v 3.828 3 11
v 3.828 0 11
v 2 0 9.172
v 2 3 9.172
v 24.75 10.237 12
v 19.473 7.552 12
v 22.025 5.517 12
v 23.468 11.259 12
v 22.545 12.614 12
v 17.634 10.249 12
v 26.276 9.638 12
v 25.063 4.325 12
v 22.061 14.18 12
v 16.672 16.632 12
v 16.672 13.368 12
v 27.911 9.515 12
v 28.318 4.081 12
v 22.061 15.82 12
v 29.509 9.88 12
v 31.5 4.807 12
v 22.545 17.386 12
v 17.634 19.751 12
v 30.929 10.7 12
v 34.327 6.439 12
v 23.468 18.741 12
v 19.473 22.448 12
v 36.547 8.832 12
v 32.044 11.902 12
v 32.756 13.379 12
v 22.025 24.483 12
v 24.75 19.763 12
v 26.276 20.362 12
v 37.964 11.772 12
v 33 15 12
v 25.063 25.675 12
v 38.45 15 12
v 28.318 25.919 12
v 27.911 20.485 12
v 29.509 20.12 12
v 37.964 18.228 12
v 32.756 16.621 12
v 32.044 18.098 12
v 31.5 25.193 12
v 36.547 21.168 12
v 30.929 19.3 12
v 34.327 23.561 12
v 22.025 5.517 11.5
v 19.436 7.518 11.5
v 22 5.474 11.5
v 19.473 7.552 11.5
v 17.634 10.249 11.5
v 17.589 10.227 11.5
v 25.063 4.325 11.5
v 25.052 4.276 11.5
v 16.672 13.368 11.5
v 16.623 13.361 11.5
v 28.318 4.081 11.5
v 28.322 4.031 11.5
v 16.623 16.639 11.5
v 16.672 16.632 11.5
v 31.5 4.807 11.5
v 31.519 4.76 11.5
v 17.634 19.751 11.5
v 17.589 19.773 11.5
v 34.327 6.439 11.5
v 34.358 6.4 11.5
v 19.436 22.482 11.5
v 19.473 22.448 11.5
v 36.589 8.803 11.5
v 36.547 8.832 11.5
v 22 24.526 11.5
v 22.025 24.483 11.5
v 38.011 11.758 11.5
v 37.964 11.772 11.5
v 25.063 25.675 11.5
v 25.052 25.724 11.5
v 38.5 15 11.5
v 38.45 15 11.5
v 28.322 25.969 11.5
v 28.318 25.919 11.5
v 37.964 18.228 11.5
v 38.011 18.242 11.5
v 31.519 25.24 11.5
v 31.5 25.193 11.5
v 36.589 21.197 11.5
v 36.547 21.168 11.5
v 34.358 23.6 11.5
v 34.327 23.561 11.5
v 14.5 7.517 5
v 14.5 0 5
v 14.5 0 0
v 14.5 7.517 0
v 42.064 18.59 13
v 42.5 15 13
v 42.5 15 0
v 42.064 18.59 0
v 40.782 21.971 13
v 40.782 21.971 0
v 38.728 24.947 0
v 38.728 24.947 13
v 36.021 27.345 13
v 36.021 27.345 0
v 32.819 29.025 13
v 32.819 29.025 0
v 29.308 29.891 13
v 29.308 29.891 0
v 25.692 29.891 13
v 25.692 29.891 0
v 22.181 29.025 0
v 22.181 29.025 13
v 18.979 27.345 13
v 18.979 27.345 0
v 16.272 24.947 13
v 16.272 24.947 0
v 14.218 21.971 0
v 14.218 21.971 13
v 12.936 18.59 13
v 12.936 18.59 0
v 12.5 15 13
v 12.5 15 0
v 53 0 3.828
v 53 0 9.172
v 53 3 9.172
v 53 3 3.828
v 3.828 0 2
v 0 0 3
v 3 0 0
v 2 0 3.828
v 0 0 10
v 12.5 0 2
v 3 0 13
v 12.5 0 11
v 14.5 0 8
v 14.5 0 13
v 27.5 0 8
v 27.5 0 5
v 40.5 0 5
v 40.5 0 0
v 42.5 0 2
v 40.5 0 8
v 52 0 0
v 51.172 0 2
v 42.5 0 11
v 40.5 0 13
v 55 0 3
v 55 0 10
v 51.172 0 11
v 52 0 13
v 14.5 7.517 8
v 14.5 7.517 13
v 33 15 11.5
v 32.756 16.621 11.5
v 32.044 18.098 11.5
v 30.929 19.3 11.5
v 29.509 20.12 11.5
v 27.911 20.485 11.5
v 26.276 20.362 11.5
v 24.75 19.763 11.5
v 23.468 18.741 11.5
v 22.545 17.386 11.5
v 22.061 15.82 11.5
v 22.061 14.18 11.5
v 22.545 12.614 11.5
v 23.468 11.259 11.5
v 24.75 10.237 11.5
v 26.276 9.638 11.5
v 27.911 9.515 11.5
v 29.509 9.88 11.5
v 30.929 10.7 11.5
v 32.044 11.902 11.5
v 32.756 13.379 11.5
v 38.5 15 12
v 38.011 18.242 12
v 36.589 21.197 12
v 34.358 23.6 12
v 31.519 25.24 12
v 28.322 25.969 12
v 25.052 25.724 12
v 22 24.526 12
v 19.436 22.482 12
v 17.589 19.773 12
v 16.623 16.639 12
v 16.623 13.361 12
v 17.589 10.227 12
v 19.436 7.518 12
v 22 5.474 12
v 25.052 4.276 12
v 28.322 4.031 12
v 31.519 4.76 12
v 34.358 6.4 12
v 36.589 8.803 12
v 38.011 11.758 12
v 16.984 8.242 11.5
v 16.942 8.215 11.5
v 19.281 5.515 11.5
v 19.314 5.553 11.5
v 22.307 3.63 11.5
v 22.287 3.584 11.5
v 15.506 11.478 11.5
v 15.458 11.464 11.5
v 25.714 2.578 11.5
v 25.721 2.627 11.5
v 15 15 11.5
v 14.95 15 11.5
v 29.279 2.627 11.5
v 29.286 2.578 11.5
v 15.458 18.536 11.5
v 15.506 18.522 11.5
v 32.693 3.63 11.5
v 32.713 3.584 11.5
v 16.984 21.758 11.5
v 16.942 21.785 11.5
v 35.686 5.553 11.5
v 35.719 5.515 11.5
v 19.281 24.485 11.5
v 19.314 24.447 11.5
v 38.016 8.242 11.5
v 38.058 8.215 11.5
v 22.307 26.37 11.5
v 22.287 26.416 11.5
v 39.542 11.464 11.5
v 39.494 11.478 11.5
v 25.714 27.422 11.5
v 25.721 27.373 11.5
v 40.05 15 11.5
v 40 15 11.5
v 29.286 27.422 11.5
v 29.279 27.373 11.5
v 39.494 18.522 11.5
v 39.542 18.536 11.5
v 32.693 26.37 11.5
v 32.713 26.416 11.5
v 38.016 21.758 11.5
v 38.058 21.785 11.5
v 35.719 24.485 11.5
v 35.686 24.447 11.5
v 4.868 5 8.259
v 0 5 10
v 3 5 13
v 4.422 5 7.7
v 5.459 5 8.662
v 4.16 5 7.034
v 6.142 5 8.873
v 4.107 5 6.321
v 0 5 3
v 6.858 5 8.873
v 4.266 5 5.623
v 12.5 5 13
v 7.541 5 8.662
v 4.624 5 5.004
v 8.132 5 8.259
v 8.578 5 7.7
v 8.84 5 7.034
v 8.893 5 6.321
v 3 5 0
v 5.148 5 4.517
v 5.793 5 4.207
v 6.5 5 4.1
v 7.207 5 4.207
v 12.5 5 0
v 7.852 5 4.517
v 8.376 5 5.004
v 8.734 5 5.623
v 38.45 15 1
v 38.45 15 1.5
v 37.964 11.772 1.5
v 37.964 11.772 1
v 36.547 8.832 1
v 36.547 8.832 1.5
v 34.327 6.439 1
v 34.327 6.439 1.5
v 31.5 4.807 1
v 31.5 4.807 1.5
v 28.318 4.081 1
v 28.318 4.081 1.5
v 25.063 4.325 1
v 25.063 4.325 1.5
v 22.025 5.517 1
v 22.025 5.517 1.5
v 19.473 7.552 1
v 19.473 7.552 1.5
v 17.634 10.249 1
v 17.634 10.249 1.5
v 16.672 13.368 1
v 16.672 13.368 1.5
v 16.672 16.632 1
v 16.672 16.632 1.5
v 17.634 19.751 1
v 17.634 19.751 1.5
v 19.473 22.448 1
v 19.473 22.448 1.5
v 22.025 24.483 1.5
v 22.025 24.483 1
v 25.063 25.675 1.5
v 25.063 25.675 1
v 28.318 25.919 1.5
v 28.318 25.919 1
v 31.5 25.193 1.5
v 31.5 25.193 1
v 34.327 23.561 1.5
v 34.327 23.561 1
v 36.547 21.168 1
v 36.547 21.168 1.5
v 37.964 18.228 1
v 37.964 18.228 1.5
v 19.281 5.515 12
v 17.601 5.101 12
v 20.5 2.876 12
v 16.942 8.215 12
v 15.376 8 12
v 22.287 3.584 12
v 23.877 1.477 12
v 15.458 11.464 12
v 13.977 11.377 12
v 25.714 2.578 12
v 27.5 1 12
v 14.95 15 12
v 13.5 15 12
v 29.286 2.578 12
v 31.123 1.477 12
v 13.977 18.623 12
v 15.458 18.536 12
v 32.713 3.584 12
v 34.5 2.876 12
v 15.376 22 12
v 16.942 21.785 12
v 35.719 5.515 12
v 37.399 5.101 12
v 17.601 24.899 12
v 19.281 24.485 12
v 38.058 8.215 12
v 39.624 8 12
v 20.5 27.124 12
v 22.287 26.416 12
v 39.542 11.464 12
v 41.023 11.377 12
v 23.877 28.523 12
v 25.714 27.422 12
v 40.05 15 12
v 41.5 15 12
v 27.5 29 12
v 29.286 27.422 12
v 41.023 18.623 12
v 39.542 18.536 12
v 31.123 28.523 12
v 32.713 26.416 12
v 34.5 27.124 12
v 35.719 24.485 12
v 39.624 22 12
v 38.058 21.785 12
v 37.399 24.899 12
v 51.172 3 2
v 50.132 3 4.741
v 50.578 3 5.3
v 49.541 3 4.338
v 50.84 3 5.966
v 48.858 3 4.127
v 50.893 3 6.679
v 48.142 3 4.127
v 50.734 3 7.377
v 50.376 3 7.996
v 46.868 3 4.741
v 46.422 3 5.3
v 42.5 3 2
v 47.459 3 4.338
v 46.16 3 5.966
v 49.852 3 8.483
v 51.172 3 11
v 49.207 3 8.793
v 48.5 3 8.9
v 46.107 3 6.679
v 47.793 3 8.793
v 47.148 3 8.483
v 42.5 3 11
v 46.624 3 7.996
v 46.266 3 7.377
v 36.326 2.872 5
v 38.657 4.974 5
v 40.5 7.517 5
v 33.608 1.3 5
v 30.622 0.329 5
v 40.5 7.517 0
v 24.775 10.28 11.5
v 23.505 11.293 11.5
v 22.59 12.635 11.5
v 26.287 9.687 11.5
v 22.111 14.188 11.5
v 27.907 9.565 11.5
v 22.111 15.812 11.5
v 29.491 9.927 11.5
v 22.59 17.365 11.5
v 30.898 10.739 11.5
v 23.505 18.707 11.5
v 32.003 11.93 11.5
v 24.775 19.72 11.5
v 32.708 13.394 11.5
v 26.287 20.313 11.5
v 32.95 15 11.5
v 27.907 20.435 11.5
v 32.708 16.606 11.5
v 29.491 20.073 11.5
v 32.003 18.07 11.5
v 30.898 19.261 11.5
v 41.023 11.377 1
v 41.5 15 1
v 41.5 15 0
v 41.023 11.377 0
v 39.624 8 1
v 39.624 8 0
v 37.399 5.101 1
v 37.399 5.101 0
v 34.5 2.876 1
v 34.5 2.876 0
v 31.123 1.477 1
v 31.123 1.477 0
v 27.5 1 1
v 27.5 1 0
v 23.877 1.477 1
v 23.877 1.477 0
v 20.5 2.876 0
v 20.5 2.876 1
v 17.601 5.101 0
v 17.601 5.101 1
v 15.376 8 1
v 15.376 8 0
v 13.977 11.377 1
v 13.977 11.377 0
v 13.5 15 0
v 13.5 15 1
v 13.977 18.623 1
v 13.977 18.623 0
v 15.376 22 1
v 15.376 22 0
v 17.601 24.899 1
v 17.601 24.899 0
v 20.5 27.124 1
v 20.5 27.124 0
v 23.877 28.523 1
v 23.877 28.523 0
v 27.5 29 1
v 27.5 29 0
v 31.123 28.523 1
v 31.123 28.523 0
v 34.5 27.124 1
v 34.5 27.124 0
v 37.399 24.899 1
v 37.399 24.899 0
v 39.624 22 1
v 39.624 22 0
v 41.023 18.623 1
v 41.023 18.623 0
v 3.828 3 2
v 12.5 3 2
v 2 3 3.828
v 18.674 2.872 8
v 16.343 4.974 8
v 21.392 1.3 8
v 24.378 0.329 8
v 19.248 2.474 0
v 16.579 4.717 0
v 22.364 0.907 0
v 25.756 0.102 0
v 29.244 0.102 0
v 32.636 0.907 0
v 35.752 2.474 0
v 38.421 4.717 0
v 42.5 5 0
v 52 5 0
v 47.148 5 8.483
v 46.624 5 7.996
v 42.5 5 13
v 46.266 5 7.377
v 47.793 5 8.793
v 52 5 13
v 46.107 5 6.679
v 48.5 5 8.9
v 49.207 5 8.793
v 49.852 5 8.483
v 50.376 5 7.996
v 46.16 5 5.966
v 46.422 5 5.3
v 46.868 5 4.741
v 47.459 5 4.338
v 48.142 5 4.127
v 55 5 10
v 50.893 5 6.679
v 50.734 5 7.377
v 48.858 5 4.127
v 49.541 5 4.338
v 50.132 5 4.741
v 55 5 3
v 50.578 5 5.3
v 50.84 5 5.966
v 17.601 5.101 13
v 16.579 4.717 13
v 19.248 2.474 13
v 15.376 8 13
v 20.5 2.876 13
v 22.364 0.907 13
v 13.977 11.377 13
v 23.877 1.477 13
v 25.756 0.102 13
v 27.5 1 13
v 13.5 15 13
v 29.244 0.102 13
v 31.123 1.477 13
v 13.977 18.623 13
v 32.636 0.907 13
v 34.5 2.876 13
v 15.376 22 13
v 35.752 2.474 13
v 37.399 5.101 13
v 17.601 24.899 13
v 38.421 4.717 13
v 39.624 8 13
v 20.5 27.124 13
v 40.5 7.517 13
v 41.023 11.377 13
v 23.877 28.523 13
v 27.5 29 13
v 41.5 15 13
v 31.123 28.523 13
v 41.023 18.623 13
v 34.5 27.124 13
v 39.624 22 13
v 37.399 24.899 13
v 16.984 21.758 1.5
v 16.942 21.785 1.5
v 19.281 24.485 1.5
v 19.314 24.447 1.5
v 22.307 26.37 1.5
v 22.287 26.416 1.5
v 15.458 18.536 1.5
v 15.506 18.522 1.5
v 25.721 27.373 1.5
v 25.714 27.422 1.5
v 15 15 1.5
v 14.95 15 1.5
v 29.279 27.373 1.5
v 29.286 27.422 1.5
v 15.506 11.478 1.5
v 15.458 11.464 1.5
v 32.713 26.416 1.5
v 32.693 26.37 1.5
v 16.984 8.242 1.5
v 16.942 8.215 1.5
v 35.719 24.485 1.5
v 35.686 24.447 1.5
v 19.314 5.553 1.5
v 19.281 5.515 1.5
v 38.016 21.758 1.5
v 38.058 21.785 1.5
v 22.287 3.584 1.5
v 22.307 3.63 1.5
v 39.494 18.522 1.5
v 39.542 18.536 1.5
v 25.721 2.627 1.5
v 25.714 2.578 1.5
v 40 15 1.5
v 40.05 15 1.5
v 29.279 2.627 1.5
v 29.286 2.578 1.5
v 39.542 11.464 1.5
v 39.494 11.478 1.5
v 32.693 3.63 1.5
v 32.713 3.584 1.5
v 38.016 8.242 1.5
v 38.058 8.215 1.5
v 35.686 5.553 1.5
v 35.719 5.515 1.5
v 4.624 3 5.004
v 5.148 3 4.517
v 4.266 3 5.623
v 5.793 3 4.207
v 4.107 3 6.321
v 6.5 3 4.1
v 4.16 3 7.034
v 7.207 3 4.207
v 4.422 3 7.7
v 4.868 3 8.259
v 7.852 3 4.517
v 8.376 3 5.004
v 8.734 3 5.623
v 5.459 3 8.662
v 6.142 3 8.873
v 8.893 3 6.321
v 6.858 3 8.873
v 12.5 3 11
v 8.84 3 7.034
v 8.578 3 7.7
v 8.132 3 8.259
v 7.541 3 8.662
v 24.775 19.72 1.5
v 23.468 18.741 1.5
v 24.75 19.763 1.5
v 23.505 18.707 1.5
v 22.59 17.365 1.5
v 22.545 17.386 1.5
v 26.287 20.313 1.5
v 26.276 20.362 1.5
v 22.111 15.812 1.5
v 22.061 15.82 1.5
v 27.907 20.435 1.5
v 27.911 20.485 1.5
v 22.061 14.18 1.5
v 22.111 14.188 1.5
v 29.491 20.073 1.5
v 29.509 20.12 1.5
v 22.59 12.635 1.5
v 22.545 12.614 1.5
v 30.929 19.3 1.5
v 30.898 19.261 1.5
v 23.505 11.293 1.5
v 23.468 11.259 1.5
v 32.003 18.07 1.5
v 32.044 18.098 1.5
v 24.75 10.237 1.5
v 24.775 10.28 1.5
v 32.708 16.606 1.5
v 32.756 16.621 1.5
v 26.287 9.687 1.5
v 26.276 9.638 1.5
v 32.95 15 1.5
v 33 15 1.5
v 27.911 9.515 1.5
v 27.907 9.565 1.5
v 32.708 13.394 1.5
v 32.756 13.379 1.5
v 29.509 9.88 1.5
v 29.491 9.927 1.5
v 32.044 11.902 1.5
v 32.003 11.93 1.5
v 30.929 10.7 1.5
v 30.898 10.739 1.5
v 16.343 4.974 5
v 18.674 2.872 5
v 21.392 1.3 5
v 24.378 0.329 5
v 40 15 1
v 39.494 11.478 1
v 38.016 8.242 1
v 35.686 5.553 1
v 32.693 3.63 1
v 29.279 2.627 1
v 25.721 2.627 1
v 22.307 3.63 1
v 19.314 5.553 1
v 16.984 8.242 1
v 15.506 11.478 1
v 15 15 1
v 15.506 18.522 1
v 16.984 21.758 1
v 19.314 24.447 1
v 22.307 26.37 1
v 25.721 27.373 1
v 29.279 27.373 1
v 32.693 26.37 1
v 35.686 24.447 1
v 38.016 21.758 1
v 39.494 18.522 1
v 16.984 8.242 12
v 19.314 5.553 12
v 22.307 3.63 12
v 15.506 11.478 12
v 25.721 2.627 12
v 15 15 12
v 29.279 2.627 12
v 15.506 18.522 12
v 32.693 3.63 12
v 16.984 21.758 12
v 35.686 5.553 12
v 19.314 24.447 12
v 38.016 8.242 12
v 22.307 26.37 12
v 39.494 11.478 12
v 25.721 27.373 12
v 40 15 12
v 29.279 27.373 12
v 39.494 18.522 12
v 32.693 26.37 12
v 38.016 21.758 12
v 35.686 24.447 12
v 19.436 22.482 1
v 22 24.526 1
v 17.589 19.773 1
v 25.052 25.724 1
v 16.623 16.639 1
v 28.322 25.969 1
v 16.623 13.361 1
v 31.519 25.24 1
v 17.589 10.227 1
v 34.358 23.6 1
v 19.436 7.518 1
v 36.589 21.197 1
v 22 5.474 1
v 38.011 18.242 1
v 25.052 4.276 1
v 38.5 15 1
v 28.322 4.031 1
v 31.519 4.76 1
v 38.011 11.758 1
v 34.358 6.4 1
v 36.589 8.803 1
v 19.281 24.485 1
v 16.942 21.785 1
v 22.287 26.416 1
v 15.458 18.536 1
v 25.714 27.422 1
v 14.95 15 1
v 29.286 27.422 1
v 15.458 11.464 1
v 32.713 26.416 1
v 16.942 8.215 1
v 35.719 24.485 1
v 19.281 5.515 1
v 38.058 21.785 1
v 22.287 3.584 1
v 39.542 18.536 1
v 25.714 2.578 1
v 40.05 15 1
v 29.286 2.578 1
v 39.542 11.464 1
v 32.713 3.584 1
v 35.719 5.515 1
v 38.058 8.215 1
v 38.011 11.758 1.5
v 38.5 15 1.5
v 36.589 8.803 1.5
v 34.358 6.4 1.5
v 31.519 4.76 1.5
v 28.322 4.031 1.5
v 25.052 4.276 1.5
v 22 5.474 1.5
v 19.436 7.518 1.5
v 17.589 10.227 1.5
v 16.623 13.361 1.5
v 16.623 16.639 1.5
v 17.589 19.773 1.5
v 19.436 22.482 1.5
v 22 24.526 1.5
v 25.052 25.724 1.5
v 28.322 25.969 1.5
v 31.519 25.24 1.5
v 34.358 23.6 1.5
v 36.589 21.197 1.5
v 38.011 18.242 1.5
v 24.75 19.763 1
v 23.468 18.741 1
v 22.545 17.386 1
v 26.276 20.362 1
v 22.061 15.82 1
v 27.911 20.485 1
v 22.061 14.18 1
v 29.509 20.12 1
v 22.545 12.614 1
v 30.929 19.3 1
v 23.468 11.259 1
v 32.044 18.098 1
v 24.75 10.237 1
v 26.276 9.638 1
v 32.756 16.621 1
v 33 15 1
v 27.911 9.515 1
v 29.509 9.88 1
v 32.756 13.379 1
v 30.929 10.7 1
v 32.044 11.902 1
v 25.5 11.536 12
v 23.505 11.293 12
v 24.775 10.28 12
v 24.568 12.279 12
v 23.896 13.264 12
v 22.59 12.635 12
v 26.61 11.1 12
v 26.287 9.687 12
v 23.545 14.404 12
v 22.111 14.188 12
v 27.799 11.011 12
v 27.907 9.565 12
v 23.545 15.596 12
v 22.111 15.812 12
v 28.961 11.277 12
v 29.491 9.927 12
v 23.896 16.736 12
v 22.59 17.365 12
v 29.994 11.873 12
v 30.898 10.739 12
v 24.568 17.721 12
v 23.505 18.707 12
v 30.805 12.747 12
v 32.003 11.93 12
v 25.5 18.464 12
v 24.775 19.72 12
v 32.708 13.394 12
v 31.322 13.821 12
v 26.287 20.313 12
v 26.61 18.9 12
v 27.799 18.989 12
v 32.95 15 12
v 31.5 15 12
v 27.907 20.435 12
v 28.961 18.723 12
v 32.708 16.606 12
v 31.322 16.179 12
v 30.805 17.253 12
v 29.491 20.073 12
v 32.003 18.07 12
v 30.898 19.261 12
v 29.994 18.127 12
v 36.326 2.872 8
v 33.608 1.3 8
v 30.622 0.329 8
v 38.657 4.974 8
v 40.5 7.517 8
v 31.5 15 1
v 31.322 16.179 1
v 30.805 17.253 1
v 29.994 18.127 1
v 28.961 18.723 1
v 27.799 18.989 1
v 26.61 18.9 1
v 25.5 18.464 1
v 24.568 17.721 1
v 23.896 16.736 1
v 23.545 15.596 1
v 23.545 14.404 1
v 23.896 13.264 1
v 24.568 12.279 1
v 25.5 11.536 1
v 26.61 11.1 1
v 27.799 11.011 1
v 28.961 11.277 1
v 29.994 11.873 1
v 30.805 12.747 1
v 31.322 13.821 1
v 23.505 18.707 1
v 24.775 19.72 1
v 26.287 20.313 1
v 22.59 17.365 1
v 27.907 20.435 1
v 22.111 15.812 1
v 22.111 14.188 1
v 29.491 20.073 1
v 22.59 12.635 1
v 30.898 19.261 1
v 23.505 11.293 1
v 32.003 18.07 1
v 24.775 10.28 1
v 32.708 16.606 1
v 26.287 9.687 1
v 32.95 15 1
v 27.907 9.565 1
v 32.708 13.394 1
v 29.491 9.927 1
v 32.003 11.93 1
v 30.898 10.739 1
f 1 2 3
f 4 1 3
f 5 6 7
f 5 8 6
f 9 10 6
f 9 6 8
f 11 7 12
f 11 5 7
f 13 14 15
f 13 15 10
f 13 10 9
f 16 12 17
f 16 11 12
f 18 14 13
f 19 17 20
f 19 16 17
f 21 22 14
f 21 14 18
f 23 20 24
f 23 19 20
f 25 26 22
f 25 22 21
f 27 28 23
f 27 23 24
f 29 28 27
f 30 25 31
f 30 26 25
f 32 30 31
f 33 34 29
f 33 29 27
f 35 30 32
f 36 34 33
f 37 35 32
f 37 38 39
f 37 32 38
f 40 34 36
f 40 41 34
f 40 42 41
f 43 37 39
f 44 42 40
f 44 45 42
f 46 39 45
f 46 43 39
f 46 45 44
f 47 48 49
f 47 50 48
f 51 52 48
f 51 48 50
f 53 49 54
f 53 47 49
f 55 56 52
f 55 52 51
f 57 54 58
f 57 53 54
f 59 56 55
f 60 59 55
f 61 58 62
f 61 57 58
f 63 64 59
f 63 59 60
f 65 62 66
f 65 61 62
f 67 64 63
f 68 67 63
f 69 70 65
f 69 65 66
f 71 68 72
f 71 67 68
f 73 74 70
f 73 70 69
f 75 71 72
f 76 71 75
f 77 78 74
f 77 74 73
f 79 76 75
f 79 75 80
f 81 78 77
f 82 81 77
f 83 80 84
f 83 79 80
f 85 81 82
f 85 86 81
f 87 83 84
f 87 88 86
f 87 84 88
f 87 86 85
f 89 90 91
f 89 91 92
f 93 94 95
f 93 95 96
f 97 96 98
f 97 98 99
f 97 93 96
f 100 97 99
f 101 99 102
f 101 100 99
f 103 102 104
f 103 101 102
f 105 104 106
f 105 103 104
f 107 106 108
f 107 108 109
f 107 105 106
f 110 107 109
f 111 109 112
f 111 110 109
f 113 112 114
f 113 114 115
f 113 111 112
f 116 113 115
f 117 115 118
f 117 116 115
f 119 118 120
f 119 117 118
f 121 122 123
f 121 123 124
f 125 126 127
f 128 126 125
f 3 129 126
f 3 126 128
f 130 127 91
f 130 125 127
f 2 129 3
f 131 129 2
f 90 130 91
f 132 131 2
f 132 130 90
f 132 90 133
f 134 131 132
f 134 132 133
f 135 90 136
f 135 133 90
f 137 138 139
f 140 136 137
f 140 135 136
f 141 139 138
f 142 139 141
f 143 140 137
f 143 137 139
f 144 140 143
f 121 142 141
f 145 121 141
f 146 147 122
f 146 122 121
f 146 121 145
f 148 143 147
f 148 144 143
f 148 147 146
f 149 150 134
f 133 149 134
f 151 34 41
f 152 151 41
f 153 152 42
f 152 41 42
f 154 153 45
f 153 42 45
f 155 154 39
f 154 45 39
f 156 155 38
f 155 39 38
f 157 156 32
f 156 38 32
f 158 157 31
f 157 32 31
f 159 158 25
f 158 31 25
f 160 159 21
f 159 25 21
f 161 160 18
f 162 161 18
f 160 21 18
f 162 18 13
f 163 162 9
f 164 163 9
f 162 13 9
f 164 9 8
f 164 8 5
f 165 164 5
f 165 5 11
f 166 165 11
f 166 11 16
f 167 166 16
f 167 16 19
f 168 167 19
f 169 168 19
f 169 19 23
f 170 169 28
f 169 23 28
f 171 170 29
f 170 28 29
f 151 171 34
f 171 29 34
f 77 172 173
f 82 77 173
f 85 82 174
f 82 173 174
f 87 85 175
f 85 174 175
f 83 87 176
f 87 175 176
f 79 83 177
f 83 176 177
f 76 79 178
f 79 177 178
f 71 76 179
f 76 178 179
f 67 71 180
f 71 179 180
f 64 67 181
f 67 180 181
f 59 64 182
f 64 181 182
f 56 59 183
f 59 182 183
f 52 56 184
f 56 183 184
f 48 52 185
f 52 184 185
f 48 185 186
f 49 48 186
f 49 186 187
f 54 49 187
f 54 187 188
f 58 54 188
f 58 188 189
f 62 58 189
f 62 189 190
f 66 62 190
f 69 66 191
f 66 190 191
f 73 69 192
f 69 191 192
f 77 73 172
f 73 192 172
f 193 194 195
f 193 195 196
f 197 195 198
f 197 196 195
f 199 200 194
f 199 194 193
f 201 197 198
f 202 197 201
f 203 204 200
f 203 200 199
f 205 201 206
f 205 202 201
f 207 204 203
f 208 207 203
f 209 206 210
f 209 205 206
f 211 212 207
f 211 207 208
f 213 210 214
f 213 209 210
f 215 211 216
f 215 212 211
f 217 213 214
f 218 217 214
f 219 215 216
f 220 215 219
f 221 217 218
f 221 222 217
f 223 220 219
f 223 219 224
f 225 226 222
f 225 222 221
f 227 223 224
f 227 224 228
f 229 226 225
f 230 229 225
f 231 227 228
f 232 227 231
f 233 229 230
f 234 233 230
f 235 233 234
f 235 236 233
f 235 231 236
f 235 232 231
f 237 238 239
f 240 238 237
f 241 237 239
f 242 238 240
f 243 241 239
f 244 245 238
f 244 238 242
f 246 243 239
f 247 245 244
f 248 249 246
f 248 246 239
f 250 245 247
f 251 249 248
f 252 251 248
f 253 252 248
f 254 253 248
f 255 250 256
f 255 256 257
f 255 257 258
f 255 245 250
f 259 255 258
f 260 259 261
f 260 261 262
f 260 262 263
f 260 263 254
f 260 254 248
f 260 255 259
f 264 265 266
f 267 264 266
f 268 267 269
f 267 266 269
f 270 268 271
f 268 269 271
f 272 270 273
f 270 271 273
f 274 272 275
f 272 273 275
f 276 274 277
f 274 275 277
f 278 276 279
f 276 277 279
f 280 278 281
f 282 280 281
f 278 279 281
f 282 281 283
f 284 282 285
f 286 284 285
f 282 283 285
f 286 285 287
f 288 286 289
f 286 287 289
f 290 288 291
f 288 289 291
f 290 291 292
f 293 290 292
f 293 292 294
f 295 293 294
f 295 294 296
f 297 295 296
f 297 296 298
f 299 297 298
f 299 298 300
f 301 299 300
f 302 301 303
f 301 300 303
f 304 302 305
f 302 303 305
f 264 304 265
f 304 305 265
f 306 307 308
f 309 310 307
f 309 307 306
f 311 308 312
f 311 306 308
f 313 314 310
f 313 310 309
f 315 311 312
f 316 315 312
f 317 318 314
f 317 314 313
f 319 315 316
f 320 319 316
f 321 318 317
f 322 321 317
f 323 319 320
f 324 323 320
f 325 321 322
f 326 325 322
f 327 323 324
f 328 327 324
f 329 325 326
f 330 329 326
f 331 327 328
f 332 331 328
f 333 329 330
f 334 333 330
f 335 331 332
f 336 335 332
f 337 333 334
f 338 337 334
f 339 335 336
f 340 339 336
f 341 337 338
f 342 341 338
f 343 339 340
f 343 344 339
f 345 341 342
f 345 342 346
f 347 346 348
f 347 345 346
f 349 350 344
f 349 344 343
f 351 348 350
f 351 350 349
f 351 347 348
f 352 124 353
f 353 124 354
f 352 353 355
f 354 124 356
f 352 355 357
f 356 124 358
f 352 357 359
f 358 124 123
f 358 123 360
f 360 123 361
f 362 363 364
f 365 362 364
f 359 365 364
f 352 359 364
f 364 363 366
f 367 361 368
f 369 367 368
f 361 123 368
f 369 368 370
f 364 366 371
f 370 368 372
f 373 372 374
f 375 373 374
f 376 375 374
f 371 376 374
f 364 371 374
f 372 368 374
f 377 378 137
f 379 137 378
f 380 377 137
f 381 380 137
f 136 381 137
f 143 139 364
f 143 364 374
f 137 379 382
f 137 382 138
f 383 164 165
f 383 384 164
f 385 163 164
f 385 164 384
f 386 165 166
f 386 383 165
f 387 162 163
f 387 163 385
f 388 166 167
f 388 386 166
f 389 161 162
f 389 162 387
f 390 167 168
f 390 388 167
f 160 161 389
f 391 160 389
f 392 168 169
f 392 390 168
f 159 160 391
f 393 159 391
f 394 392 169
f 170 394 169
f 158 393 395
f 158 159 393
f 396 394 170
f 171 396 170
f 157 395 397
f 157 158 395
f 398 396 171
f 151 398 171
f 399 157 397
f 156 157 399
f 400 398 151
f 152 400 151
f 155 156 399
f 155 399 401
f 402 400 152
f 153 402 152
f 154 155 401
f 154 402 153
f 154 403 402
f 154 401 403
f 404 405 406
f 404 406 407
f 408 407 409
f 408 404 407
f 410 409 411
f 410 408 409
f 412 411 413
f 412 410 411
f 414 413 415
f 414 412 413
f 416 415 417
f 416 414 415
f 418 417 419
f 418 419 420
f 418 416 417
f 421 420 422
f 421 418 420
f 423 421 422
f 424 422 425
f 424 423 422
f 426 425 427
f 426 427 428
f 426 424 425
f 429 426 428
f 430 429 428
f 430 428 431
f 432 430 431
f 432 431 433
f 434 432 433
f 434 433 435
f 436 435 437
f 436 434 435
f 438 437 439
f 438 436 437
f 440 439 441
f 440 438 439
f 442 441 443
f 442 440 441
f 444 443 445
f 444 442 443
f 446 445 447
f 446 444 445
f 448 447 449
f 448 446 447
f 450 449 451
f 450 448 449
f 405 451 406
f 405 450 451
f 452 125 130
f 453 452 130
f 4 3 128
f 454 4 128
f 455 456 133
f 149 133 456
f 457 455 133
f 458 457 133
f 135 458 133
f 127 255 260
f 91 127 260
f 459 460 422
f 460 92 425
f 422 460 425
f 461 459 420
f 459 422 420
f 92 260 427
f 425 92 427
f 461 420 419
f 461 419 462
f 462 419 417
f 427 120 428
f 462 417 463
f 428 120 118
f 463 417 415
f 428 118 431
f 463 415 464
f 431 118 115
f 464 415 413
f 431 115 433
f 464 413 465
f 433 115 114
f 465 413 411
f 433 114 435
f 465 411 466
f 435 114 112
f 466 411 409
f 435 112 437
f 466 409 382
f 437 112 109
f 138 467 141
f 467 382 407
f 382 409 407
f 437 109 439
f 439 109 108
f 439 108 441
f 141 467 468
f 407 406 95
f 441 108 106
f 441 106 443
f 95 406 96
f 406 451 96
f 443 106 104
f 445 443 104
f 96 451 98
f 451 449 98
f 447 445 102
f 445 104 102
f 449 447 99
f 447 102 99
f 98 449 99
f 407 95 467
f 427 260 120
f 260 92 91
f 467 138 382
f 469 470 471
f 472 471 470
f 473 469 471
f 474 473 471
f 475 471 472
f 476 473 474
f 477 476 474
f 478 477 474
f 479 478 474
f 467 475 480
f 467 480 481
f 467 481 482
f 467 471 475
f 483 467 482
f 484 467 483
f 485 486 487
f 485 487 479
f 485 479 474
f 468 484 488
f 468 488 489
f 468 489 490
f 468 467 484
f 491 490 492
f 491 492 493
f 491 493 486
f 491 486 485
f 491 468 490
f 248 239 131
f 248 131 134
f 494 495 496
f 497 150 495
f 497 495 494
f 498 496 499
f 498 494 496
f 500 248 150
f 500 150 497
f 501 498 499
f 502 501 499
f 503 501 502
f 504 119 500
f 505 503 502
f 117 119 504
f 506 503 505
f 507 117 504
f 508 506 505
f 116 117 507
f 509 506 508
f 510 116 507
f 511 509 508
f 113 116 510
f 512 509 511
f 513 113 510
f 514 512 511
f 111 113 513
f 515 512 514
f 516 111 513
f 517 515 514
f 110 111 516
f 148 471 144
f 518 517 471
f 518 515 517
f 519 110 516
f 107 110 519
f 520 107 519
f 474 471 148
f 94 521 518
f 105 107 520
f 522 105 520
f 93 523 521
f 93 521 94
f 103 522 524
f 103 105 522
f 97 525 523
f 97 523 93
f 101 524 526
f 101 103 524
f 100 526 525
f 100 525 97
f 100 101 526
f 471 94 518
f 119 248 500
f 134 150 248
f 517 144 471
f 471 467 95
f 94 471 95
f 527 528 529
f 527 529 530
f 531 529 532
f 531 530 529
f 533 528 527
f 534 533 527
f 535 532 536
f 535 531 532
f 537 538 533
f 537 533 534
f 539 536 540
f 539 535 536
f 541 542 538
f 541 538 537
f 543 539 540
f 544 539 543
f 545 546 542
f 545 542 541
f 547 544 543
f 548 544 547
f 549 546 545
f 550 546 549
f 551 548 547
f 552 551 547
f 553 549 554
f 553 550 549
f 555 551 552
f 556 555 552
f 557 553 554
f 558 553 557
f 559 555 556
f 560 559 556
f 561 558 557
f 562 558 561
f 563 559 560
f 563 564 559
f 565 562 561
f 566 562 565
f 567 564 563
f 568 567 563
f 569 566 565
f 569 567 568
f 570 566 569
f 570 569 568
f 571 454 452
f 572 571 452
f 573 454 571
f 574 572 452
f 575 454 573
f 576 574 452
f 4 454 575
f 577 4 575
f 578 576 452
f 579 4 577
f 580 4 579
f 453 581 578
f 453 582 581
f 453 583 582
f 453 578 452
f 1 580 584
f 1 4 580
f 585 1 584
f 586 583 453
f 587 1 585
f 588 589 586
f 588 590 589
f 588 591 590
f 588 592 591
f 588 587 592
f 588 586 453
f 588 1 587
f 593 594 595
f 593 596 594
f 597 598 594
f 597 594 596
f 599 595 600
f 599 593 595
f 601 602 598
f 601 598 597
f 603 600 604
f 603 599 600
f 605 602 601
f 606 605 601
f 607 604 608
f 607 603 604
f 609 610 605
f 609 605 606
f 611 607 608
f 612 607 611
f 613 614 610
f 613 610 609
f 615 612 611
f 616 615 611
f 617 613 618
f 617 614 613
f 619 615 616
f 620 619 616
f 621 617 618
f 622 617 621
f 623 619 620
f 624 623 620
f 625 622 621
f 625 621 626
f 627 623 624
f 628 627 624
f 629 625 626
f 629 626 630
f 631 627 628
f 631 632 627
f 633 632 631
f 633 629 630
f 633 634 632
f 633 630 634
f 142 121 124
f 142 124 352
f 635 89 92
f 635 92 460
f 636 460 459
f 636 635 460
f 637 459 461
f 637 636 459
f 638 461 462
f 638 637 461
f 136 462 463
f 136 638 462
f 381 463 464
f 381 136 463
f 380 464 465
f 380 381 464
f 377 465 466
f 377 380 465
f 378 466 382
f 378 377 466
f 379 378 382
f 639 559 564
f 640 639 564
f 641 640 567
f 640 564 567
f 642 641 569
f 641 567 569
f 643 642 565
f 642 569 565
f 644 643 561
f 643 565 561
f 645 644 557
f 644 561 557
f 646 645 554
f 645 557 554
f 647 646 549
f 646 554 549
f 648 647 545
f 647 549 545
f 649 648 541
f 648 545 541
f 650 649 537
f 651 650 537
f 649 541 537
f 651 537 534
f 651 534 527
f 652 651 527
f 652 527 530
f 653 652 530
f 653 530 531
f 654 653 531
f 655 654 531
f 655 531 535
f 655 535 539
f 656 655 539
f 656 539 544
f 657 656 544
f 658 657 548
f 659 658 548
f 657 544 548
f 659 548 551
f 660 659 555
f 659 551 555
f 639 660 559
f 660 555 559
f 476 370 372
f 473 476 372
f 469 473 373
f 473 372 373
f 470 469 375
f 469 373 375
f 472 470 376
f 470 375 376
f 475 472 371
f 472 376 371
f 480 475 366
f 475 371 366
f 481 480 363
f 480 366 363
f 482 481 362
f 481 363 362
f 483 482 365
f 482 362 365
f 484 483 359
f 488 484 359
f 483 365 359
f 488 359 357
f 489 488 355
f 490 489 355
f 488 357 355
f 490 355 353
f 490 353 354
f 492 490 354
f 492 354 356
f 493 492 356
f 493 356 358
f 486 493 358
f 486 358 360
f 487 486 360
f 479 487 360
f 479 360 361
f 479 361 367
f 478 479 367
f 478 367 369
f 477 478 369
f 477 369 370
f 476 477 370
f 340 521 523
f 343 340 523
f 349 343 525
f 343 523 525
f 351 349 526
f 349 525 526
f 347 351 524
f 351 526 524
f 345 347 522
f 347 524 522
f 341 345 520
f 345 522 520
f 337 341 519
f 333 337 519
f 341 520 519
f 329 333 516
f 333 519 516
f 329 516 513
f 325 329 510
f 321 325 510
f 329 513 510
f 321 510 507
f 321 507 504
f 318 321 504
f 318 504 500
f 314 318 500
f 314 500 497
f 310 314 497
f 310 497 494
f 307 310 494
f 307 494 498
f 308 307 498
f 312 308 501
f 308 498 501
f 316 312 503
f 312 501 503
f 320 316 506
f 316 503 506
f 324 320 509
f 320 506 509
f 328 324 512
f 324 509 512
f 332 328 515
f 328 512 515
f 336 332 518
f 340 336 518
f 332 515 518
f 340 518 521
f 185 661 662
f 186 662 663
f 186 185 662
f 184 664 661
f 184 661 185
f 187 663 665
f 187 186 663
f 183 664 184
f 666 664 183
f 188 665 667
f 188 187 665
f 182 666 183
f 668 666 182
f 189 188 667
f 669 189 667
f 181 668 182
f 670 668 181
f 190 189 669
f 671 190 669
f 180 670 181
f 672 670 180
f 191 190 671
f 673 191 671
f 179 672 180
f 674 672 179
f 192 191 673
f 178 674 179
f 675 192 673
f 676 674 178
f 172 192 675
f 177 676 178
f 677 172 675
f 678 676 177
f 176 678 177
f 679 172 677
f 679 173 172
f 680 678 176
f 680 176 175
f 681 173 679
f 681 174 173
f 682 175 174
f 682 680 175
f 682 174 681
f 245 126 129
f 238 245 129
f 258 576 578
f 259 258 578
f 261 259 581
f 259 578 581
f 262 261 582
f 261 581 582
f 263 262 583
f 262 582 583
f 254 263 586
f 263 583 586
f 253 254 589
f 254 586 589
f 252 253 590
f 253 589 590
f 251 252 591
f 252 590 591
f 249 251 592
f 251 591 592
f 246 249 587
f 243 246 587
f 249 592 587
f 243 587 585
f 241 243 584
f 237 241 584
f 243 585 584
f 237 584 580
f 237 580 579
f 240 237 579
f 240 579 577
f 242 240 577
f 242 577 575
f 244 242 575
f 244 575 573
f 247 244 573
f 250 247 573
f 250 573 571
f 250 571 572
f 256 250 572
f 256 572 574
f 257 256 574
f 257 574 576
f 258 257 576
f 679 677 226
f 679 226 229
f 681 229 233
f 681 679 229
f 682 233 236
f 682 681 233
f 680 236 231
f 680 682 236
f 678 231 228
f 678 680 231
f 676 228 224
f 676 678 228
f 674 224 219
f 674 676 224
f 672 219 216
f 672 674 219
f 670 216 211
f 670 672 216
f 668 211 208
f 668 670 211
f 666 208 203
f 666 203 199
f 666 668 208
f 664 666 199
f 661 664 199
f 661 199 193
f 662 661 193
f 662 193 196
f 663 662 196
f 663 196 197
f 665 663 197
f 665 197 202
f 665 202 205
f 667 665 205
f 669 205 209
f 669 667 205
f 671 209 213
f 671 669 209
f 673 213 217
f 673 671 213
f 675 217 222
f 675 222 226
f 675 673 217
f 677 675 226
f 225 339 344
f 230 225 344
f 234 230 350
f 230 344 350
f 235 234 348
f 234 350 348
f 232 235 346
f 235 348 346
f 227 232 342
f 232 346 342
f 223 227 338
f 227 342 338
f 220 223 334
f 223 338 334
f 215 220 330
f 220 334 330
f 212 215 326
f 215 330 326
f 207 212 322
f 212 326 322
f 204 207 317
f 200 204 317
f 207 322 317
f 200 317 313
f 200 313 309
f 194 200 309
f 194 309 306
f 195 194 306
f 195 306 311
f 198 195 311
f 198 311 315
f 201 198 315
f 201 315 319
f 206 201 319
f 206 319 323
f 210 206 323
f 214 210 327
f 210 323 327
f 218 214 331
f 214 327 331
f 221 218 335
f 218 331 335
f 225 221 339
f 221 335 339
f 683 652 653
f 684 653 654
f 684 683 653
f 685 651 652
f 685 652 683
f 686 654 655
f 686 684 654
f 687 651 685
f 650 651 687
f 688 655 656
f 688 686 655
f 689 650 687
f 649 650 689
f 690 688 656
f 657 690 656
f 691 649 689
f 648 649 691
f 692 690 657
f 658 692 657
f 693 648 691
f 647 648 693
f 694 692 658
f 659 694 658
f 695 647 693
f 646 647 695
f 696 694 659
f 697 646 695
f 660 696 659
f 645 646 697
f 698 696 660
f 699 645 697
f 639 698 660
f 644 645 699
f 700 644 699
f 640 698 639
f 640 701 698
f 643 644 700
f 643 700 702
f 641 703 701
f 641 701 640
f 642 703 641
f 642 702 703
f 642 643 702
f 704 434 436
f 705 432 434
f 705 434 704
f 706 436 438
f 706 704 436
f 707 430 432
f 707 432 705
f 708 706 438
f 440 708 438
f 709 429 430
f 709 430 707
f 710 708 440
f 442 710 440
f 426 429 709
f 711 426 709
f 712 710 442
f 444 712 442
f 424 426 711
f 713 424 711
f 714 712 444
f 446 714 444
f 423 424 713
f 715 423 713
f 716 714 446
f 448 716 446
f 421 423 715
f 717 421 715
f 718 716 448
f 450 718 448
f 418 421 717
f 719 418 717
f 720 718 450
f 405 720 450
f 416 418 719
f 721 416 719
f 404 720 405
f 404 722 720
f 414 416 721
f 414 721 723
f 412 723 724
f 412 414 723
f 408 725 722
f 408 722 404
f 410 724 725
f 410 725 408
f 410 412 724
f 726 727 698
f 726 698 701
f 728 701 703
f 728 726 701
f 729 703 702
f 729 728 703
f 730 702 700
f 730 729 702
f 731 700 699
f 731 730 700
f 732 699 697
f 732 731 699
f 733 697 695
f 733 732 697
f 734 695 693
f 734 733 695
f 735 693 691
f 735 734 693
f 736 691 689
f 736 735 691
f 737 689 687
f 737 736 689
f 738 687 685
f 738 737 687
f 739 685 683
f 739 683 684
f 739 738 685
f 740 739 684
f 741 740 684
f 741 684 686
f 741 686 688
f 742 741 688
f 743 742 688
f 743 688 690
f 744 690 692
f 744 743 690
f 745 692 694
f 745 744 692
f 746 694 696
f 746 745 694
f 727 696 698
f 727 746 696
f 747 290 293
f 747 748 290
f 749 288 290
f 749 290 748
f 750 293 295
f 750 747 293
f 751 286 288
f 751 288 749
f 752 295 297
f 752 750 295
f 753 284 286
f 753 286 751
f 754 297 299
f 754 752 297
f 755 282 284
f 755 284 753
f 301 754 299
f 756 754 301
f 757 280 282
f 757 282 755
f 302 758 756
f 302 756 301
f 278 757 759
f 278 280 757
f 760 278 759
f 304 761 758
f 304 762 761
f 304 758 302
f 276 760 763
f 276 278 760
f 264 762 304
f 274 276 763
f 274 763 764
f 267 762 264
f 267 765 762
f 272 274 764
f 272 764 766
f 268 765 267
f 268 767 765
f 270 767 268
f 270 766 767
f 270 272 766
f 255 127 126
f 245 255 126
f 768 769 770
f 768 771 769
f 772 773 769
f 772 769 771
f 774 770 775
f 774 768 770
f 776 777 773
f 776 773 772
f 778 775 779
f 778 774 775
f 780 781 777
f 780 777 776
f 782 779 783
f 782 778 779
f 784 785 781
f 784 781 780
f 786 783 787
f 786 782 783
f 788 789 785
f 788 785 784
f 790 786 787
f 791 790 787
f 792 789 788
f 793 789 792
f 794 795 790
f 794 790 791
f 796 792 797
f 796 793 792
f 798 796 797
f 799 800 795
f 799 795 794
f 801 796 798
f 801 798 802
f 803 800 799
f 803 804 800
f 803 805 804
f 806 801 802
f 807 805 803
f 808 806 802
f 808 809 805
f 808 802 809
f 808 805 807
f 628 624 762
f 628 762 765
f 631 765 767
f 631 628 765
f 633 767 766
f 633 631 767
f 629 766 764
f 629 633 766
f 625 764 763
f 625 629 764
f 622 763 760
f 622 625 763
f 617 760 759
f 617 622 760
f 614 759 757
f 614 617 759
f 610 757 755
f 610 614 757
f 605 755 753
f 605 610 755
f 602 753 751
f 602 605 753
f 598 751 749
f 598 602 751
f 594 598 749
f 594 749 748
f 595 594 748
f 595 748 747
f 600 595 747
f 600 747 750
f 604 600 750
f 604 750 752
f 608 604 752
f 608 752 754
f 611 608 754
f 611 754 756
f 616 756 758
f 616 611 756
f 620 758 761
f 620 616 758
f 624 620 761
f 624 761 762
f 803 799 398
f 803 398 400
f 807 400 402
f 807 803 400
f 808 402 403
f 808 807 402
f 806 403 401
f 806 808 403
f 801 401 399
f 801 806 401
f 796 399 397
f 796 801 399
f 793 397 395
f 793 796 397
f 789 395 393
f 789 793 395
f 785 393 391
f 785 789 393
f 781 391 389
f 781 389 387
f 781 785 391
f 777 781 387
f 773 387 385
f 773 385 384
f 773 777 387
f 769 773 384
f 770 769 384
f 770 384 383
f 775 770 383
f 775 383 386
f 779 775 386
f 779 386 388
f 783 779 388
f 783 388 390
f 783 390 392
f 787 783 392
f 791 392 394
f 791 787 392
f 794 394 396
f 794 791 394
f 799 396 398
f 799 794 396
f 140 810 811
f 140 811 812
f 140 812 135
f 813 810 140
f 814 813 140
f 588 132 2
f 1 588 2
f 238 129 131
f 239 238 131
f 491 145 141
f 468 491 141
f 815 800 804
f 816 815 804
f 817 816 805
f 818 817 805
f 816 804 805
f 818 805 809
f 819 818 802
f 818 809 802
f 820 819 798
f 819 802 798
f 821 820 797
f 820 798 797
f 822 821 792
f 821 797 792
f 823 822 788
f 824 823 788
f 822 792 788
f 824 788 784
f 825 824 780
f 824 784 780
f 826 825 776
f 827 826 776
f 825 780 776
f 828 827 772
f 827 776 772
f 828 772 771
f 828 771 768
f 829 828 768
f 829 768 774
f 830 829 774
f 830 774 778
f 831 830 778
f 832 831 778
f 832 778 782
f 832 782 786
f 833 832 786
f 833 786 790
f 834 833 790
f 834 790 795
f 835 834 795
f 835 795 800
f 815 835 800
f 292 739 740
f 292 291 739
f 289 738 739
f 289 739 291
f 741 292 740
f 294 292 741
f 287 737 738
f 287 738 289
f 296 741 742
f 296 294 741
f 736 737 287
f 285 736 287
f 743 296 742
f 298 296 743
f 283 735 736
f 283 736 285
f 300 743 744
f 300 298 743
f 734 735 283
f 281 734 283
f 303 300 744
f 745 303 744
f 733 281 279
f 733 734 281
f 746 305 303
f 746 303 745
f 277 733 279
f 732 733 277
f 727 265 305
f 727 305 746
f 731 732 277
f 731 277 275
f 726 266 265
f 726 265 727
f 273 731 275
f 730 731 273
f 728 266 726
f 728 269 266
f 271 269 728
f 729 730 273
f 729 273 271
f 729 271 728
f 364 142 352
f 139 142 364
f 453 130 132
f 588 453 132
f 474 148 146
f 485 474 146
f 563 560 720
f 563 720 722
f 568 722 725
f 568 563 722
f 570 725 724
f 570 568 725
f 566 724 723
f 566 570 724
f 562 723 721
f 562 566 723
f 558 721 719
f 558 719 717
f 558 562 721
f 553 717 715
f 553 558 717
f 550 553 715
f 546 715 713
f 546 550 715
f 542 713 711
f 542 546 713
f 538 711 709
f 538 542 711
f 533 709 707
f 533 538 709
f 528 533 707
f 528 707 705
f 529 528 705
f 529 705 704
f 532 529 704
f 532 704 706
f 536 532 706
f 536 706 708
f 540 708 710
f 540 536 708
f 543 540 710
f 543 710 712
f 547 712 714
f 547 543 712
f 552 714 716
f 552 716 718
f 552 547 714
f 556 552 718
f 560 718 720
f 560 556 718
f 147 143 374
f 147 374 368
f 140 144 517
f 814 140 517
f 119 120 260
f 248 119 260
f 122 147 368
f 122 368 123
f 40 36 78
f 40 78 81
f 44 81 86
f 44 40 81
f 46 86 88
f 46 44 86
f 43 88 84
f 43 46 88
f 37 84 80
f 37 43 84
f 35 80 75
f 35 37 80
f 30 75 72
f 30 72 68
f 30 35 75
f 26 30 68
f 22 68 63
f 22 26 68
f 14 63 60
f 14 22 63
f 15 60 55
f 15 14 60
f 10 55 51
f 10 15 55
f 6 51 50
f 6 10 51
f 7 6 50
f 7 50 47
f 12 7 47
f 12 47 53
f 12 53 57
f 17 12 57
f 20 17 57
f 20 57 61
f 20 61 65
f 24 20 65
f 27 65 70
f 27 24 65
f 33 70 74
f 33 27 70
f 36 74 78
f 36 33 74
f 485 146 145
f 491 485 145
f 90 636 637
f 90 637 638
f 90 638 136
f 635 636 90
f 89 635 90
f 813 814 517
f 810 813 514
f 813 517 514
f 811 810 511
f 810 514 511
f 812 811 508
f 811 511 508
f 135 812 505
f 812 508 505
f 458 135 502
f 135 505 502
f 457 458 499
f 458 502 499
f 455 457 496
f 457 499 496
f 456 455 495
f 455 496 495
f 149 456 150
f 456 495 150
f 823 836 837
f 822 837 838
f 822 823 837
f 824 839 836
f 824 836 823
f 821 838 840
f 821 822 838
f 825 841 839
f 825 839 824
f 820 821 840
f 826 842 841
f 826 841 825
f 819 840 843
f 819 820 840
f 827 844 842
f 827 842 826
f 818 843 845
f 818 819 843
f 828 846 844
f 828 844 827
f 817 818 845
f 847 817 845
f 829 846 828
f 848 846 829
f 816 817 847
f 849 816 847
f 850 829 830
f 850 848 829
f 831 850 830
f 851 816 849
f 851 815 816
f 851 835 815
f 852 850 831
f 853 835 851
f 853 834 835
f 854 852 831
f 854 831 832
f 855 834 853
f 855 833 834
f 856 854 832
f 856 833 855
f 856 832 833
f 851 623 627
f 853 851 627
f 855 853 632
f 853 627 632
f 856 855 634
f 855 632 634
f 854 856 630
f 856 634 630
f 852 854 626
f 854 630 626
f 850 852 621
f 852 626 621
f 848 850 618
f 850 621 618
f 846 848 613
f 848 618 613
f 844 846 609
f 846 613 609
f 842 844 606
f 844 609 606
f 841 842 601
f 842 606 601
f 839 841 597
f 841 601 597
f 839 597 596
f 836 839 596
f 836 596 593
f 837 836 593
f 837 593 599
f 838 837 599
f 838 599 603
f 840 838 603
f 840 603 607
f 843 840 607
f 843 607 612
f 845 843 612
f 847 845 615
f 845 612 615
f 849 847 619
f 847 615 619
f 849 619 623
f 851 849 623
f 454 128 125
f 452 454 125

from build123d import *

# Parameters (mm, degrees)
BOSS_EXTRUDE1_DEPTH = 5
BOSS_EXTRUDE2_DEPTH = 13
CUT_EXTRUDE1_DEPTH  = 5
CUT_EXTRUDE2_START  = -5
CUT_EXTRUDE2_DEPTH  = 5
SKETCH5_R           = 2.4
CUT_EXTRUDE3_DEPTH  = 64.984373092
CUT_EXTRUDE4_DEPTH  = 3
SKETCH7_R           = 14
CUT_EXTRUDE5_DEPTH  = 1
CUT_EXTRUDE6_START  = -1
SKETCH8_R           = 14
CUT_EXTRUDE6_DEPTH  = 1
SKETCH9_R           = 4
CUT_EXTRUDE7_DEPTH  = 64.788713735
SKETCH10_R          = 12.55
SKETCH10_R_2        = 12.5
CUT_EXTRUDE8_DEPTH  = 0.5
SKETCH11_R          = 11
SKETCH11_R_2        = 10.95
CUT_EXTRUDE9_DEPTH  = 0.5
SKETCH12_R          = 5.5
SKETCH12_R_2        = 5.45
CUT_EXTRUDE10_DEPTH = 0.5
CUT_EXTRUDE11_START = -0.5
SKETCH13_R          = 5.5
SKETCH13_R_2        = 5.45
CUT_EXTRUDE11_DEPTH = 0.5
CUT_EXTRUDE12_START = -0.5
SKETCH14_R          = 12.55
SKETCH14_R_2        = 12.5
CUT_EXTRUDE12_DEPTH = 0.5
CUT_EXTRUDE13_START = -0.5
SKETCH15_R          = 11
SKETCH15_R_2        = 10.95
CUT_EXTRUDE13_DEPTH = 0.5


with BuildPart() as part:
    # Sketch1 → Boss-Extrude1 (new body)
    with BuildSketch(Plane(origin=(0, 0, 0), x_dir=(1, 0, 0), z_dir=(0, 1, 0))):
        Polygon((0, -3), (0, -10), (3, -13), (52, -13), (55, -10), (55, -3), (52, 0), (3, 0), align=None)
    extrude(amount=BOSS_EXTRUDE1_DEPTH)

    # Sketch2 → Boss-Extrude2 (add)
    with BuildSketch(Plane.XY.offset(13)):
        with BuildLine():
            Line((12.5, 15), (12.5, 0))
            Line((12.5, 0), (42.5, 0))
            Line((42.5, 0), (42.5, 15))
            ThreePointArc((42.5, 15), (27.5, 30), (12.5, 15))
        make_face()
    extrude(amount=-BOSS_EXTRUDE2_DEPTH)

    # Sketch3 → Cut-Extrude1 (cut)
    with BuildSketch(Plane.XY.offset(13)):
        with BuildLine():
            Line((14.5, 7.516685226), (14.5, 0))
            Line((14.5, 0), (14.5, -1))
            Line((14.5, -1), (40.5, -1))
            Line((40.5, -1), (40.5, 0))
            Line((40.5, 0), (40.5, 7.516685226))
            ThreePointArc((40.5, 7.516685226), (27.5, 0), (14.5, 7.516685226))
        make_face()
    extrude(amount=-CUT_EXTRUDE1_DEPTH, mode=Mode.SUBTRACT)

    # Sketch4 → Cut-Extrude2 (cut)
    with BuildSketch(Plane(origin=(0, 0, 0), x_dir=(-1, 0, 0), z_dir=(0, 0, -1)).offset(CUT_EXTRUDE2_START)):
        with BuildLine():
            Line((-40.5, 7.516685226), (-40.5, -2.151111231))
            Line((-40.5, -2.151111231), (-14.5, -2.151111231))
            Line((-14.5, -2.151111231), (-14.5, 7.516685226))
            ThreePointArc((-14.5, 7.516685226), (-27.5, 0), (-40.5, 7.516685226))
        make_face()
    extrude(amount=CUT_EXTRUDE2_DEPTH, mode=Mode.SUBTRACT)

    # Sketch5 → Cut-Extrude3 (cut, through all)
    with BuildSketch(Plane.XZ):
        with Locations(Location((6.5, 6.5, 0), (0, 0, 270))):
            Circle(SKETCH5_R)
        with Locations(Location((48.5, 6.5, 0), (0, 0, 90))):
            Circle(SKETCH5_R)
    extrude(amount=-CUT_EXTRUDE3_DEPTH, mode=Mode.SUBTRACT)

    # Sketch6 → Cut-Extrude4 (cut)
    with BuildSketch(Plane.XZ):
        Polygon((12.5, 2), (12.5, 11), (3.828427125, 11), (2, 9.171572875), (2, 3.828427125), (3.828427125, 2), align=None)
        Polygon((51.171572875, 2), (42.5, 2), (42.5, 11), (51.171572875, 11), (53, 9.171572875), (53, 3.828427125), align=None)
    extrude(amount=-CUT_EXTRUDE4_DEPTH, mode=Mode.SUBTRACT)

    # Sketch7 → Cut-Extrude5 (cut)
    with BuildSketch(Plane.XY.offset(13)):
        with Locations((27.5, 15)):
            Circle(SKETCH7_R)
    extrude(amount=-CUT_EXTRUDE5_DEPTH, mode=Mode.SUBTRACT)

    # Sketch8 → Cut-Extrude6 (cut)
    with BuildSketch(Plane(origin=(0, 0, 0), x_dir=(-1, 0, 0), z_dir=(0, 0, -1)).offset(CUT_EXTRUDE6_START)):
        with Locations(Location((-27.5, 15, 0), (0, 0, 180))):
            Circle(SKETCH8_R)
    extrude(amount=CUT_EXTRUDE6_DEPTH, mode=Mode.SUBTRACT)

    # Sketch9 → Cut-Extrude7 (cut, through all)
    with BuildSketch(Plane.XY.offset(12)):
        with Locations((27.5, 15)):
            Circle(SKETCH9_R)
    extrude(amount=-CUT_EXTRUDE7_DEPTH, mode=Mode.SUBTRACT)

    # Sketch10 → Cut-Extrude8 (cut)
    with BuildSketch(Plane.XY.offset(12)):
        with Locations((27.5, 15)):
            Circle(SKETCH10_R)
        with Locations((27.5, 15)):
            Circle(SKETCH10_R_2, mode=Mode.SUBTRACT)
    extrude(amount=-CUT_EXTRUDE8_DEPTH, mode=Mode.SUBTRACT)

    # Sketch11 → Cut-Extrude9 (cut)
    with BuildSketch(Plane.XY.offset(12)):
        with Locations((27.5, 15)):
            Circle(SKETCH11_R)
        with Locations((27.5, 15)):
            Circle(SKETCH11_R_2, mode=Mode.SUBTRACT)
    extrude(amount=-CUT_EXTRUDE9_DEPTH, mode=Mode.SUBTRACT)

    # Sketch12 → Cut-Extrude10 (cut)
    with BuildSketch(Plane.XY.offset(12)):
        with Locations((27.5, 15)):
            Circle(SKETCH12_R)
        with Locations((27.5, 15)):
            Circle(SKETCH12_R_2, mode=Mode.SUBTRACT)
    extrude(amount=-CUT_EXTRUDE10_DEPTH, mode=Mode.SUBTRACT)

    # Sketch13 → Cut-Extrude11 (cut)
    with BuildSketch(Plane(origin=(0, 0, 1), x_dir=(-1, 0, 0), z_dir=(0, 0, -1)).offset(CUT_EXTRUDE11_START)):
        with Locations(Location((-27.5, 15, 0), (0, 0, 180))):
            Circle(SKETCH13_R)
        with Locations(Location((-27.5, 15, 0), (0, 0, 180))):
            Circle(SKETCH13_R_2, mode=Mode.SUBTRACT)
    extrude(amount=CUT_EXTRUDE11_DEPTH, mode=Mode.SUBTRACT)

    # Sketch14 → Cut-Extrude12 (cut)
    with BuildSketch(Plane(origin=(0, 0, 1), x_dir=(-1, 0, 0), z_dir=(0, 0, -1)).offset(CUT_EXTRUDE12_START)):
        with Locations(Location((-27.5, 15, 0), (0, 0, 180))):
            Circle(SKETCH14_R)
        with Locations(Location((-27.5, 15, 0), (0, 0, 180))):
            Circle(SKETCH14_R_2, mode=Mode.SUBTRACT)
    extrude(amount=CUT_EXTRUDE12_DEPTH, mode=Mode.SUBTRACT)

    # Sketch15 → Cut-Extrude13 (cut)
    with BuildSketch(Plane(origin=(0, 0, 1), x_dir=(-1, 0, 0), z_dir=(0, 0, -1)).offset(CUT_EXTRUDE13_START)):
        with Locations(Location((-27.5, 15, 0), (0, 0, 180))):
            Circle(SKETCH15_R)
        with Locations(Location((-27.5, 15, 0), (0, 0, 180))):
            Circle(SKETCH15_R_2, mode=Mode.SUBTRACT)
    extrude(amount=CUT_EXTRUDE13_DEPTH, mode=Mode.SUBTRACT)


solid = part.part
